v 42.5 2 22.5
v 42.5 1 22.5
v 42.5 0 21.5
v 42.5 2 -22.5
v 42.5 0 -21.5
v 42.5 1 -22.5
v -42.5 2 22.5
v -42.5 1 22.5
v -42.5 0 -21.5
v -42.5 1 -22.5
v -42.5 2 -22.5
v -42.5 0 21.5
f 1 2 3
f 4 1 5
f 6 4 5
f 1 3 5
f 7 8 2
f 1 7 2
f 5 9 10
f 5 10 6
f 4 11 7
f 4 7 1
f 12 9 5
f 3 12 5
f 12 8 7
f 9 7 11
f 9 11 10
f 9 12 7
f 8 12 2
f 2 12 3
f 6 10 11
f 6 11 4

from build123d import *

# Parameters (mm, degrees)
SKETCH_1_W      = 85
SKETCH_1_H      = 45
EXTRUDE_1_DEPTH = 2
CHAMFER_1_SIZE  = 1


with BuildPart() as part:
    # 草图1 → 凸台-拉伸1 (new body)
    with BuildSketch(Plane(origin=(0, 0, 0), x_dir=(1, 0, 0), z_dir=(0, 1, 0))):
        Rectangle(SKETCH_1_W, SKETCH_1_H)
    extrude(amount=EXTRUDE_1_DEPTH)

    # 倒角1
    chamfer_1_edges = [part.edges().sort_by_distance(p)[0] for p in [
        (0, 0, 22.5),
        (0, 0, -22.5),
    ]]
    chamfer(chamfer_1_edges, length=CHAMFER_1_SIZE)


solid = part.part
